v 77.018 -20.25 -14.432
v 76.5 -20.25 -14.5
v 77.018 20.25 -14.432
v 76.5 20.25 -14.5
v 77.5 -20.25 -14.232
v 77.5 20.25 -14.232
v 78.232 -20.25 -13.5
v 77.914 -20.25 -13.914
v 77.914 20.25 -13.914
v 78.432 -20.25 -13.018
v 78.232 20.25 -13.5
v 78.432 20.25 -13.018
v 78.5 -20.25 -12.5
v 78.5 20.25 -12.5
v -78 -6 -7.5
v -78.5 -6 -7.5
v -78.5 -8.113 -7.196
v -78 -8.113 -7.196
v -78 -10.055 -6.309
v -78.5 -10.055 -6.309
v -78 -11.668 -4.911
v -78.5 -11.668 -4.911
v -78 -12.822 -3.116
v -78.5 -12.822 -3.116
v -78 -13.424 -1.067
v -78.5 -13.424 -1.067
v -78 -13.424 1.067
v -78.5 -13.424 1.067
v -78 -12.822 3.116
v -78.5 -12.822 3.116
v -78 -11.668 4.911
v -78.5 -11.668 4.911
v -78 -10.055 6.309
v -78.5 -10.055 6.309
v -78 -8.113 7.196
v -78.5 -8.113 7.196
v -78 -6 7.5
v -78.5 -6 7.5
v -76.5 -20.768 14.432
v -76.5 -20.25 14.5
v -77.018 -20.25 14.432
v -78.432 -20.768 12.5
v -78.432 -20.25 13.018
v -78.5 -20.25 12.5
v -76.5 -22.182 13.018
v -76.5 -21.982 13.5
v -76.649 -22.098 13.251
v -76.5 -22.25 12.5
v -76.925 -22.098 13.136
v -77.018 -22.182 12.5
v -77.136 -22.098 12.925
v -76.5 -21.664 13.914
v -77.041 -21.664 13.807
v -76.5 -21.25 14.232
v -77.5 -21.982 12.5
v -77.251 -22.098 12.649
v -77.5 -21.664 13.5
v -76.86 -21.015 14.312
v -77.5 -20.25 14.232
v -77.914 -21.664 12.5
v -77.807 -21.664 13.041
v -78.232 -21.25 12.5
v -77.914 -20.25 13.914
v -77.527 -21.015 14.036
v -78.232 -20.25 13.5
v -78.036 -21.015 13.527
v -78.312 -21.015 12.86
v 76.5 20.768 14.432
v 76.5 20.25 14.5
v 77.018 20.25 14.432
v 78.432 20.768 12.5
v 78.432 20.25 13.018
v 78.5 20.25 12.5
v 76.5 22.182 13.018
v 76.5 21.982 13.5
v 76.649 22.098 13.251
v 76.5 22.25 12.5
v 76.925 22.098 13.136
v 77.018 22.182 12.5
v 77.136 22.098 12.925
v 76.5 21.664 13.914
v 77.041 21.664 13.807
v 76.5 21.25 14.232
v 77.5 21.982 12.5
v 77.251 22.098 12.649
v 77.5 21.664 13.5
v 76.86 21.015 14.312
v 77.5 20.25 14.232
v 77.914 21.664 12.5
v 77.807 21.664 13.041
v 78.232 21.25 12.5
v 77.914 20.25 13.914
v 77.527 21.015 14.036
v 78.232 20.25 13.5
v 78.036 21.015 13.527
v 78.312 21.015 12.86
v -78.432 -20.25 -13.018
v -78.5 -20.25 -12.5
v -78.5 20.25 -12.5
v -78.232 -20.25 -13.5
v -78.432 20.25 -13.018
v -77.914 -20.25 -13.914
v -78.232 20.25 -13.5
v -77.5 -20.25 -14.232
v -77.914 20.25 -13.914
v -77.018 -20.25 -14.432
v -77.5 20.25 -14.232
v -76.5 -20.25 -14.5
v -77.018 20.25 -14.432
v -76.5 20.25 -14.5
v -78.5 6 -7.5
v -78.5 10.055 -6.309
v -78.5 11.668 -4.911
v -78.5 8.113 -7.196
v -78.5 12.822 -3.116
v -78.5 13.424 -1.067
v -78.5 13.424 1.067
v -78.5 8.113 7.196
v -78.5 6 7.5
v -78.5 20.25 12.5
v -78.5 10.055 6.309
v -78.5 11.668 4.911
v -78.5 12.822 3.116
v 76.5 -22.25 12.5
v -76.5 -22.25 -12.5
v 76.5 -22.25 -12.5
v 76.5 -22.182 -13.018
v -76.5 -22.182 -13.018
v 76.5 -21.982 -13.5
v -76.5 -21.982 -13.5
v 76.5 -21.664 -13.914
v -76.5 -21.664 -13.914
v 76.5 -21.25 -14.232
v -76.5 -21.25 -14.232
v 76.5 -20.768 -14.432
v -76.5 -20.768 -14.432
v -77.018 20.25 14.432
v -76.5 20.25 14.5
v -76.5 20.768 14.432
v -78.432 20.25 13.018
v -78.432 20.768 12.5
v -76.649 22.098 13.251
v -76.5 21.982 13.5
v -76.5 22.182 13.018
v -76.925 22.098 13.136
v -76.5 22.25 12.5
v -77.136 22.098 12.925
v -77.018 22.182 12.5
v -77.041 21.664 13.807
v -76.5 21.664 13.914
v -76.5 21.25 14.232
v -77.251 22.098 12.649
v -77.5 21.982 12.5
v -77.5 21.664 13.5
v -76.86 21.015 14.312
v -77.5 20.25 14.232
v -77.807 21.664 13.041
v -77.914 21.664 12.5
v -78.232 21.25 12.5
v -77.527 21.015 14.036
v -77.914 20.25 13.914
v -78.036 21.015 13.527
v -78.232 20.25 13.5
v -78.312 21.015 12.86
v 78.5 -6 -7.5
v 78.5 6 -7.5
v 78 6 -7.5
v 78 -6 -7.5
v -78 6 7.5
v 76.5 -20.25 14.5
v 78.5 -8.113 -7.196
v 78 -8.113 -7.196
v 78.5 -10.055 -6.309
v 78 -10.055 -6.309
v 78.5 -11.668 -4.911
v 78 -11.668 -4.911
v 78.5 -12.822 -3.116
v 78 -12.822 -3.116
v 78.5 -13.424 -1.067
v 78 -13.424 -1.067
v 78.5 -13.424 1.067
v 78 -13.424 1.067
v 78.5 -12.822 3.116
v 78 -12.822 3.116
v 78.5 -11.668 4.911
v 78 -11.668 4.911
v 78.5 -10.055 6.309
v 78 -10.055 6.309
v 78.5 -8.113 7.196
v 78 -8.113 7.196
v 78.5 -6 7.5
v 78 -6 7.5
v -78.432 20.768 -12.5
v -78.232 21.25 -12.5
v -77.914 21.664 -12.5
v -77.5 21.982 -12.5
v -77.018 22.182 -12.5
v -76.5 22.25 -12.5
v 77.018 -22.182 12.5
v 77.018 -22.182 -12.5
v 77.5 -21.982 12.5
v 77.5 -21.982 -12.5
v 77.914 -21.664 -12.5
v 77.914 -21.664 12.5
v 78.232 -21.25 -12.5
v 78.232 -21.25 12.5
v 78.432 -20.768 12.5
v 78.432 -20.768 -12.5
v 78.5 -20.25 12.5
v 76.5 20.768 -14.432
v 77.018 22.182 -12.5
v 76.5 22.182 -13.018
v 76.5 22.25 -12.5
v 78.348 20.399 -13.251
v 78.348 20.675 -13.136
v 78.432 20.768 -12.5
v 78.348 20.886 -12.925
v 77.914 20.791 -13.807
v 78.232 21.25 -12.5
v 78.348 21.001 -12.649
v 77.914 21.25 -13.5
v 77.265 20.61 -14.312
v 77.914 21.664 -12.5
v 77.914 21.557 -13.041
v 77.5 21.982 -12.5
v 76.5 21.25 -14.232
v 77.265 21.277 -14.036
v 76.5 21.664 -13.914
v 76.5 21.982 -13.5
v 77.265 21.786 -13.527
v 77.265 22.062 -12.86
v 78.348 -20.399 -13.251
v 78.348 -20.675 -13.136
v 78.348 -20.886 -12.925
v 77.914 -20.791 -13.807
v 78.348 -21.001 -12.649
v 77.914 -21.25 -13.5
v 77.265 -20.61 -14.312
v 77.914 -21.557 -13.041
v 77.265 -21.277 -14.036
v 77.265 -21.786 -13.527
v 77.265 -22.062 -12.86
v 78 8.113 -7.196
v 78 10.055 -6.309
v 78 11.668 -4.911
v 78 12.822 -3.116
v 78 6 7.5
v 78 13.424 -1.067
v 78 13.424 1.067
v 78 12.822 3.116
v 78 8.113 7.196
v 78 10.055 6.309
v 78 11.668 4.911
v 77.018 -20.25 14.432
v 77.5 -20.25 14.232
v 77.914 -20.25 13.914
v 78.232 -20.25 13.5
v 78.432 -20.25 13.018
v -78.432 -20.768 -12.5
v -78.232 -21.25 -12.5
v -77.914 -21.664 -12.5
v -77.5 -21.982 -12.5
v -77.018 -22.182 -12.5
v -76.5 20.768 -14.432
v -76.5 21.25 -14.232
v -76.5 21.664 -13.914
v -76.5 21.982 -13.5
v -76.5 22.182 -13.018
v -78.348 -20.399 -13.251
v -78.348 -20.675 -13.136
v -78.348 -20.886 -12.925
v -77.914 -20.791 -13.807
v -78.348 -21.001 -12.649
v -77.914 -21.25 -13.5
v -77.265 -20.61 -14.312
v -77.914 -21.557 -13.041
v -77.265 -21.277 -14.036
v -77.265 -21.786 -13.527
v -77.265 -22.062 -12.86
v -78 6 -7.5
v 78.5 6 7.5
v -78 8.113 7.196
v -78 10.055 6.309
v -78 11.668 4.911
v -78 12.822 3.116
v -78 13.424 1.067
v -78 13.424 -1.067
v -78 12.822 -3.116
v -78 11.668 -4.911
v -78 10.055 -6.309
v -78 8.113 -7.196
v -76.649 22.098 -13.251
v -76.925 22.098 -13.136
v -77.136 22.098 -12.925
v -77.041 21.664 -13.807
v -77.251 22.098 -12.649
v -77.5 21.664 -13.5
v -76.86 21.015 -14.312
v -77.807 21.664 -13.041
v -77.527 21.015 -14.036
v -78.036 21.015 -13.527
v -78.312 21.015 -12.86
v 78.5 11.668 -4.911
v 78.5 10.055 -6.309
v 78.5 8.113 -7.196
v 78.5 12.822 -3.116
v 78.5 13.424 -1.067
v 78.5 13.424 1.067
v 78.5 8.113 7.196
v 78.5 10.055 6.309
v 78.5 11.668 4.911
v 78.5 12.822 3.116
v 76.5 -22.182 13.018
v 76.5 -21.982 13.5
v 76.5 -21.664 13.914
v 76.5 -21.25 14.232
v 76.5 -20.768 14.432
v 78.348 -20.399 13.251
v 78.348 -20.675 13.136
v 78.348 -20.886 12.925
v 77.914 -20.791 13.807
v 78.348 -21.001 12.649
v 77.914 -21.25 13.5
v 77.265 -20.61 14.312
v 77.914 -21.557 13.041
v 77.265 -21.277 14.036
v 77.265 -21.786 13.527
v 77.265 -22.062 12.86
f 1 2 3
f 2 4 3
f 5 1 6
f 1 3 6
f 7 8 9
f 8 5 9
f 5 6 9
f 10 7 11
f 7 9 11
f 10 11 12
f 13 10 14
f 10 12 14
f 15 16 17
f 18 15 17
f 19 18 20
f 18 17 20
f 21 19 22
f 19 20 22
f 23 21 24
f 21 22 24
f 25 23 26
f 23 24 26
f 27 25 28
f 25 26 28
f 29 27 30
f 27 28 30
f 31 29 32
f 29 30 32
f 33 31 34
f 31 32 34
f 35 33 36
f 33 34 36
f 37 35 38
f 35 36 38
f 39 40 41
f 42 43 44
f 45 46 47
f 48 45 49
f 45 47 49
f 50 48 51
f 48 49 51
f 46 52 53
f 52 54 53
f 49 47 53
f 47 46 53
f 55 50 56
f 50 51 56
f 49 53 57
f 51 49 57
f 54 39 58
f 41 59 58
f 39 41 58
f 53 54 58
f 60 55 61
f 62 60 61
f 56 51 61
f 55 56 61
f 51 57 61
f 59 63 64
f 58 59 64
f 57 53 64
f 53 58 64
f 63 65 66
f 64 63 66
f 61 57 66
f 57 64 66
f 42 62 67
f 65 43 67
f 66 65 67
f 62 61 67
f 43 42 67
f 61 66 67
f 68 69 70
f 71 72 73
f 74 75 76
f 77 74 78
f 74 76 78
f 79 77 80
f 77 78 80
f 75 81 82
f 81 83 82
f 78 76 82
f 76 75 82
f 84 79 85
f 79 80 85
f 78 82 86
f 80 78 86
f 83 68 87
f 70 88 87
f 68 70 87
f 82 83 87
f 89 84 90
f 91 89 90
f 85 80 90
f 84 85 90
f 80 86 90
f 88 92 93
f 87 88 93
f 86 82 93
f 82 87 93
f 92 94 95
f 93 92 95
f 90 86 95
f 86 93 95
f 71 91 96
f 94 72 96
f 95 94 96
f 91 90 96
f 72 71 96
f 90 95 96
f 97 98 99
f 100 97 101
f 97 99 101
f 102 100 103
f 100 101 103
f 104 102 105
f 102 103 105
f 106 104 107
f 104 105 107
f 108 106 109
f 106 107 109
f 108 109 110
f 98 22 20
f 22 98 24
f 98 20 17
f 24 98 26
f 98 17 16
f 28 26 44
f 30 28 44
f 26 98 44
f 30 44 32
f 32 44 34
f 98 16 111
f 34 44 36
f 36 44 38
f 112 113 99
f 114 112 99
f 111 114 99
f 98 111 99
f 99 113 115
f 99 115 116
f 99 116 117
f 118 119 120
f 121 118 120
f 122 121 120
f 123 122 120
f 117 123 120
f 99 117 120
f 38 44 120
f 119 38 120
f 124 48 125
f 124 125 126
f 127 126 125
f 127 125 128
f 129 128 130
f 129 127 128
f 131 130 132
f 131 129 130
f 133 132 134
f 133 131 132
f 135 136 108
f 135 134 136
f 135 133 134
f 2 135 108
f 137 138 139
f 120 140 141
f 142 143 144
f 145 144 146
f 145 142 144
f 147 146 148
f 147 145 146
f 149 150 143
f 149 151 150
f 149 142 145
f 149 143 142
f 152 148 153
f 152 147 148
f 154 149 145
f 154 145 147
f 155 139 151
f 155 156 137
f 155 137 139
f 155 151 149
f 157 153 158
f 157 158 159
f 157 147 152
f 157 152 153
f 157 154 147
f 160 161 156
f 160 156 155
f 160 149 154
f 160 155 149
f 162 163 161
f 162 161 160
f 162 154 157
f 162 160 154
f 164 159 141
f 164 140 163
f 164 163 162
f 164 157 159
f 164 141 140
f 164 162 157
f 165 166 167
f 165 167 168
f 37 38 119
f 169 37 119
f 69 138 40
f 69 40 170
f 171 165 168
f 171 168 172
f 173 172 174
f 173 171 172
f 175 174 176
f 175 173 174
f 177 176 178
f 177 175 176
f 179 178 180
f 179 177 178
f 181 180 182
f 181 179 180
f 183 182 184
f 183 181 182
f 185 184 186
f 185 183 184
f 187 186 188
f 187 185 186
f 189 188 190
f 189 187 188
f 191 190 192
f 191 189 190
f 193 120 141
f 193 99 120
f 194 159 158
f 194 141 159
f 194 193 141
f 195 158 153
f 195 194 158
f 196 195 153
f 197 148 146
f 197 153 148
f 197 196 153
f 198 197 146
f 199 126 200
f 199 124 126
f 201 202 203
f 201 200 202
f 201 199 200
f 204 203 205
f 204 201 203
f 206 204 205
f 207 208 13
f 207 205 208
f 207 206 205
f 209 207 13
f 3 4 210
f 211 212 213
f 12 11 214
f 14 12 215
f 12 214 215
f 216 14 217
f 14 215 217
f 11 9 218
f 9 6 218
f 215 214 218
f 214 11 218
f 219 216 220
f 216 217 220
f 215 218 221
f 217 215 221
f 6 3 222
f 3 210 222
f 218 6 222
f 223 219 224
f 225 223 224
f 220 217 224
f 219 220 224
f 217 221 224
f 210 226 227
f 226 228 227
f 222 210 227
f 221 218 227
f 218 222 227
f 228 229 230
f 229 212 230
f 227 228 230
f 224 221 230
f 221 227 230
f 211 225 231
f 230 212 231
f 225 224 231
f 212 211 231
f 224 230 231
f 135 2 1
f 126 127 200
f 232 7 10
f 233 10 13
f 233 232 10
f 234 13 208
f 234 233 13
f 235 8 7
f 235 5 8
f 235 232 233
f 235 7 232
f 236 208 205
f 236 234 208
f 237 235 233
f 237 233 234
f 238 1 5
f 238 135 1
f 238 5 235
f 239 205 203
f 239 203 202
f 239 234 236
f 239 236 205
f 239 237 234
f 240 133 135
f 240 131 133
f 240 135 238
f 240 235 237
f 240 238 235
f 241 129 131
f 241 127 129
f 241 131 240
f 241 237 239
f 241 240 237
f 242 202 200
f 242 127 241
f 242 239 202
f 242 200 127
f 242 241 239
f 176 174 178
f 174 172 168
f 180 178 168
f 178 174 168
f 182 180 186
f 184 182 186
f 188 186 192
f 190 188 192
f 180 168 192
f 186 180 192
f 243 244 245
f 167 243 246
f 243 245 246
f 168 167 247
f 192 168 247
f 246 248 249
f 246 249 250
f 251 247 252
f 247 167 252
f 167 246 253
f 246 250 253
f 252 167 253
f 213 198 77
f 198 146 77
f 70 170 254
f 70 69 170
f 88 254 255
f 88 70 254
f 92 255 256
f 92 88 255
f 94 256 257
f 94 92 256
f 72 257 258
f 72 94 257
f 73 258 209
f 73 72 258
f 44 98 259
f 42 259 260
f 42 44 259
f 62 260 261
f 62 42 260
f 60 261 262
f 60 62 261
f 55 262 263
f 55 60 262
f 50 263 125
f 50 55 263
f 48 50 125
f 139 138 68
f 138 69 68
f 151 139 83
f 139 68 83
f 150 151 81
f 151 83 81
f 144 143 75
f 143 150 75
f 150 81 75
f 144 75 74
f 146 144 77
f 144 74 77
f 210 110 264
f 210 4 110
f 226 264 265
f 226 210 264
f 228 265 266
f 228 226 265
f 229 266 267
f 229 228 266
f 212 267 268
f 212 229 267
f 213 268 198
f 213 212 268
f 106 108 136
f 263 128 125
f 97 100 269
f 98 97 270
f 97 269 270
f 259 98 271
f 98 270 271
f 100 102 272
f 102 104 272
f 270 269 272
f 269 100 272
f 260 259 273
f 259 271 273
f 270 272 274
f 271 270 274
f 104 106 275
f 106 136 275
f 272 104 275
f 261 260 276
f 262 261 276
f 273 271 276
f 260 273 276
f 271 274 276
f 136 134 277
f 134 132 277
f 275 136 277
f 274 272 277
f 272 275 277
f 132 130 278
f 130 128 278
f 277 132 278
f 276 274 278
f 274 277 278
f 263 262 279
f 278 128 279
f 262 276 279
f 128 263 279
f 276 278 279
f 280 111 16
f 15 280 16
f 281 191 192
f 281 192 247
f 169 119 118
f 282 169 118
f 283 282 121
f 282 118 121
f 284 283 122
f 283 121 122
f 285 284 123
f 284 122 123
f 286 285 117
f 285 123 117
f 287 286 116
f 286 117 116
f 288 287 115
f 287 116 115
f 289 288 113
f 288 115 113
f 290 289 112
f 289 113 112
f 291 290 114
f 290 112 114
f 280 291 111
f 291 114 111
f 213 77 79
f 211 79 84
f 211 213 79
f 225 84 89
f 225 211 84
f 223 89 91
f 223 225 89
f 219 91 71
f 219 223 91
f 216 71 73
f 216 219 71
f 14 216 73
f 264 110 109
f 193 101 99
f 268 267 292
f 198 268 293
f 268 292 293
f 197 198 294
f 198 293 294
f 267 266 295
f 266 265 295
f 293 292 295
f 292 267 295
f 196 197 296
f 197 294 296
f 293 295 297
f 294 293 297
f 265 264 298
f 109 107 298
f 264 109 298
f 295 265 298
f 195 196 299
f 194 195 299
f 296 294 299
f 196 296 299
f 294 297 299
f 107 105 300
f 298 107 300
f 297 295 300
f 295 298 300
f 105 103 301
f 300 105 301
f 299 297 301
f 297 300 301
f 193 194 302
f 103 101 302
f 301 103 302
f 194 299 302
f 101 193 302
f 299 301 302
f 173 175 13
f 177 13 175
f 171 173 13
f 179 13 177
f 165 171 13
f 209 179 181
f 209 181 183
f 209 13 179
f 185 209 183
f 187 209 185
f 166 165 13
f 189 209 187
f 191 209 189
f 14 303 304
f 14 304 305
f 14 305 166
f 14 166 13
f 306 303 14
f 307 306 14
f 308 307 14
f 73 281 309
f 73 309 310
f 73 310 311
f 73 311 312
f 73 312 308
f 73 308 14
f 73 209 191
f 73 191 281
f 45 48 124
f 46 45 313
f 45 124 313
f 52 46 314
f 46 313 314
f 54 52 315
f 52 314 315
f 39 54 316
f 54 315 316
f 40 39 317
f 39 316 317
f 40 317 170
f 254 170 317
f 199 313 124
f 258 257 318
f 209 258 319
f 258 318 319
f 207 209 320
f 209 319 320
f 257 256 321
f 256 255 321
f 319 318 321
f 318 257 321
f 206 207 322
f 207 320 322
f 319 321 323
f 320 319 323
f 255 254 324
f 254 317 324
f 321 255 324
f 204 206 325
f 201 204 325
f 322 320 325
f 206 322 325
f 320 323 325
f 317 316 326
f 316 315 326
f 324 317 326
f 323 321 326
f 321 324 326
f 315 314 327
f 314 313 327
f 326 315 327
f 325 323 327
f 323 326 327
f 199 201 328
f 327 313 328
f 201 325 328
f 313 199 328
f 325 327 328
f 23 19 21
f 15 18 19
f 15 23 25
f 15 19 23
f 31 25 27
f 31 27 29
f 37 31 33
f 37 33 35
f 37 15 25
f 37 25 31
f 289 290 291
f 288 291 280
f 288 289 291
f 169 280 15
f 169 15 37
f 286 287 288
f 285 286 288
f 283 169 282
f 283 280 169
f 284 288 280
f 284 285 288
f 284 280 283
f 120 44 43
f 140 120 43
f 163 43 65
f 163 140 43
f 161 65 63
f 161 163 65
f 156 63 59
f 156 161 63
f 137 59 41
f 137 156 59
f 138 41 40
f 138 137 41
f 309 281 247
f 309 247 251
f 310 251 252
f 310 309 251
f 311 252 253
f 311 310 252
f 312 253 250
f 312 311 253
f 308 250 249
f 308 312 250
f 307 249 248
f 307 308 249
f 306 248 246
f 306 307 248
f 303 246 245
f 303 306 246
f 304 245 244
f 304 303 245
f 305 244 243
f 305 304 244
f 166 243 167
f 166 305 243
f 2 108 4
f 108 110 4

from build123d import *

# Parameters (mm, degrees)
ESBO_O1_W                = 157
ESBO_O1_H                = 44.5
RESSALTO_EXTRUS_O1_DEPTH = 14.5
CORTE_EXTRUS_O1_DEPTH    = 0.5
FILETE1_R                = 2


with BuildPart() as part:
    # Esboço1 → Ressalto-extrusão1 (new body, symmetric)
    with BuildSketch(Plane.XY):
        Rectangle(ESBO_O1_W, ESBO_O1_H)
    extrude(amount=RESSALTO_EXTRUS_O1_DEPTH, both=True)

    # Esboço2 → Corte-extrusão1 (cut)
    with BuildSketch(Plane(origin=(78.5, 0, 0), x_dir=(0, 0, -1), z_dir=(1, 0, 0))):
        with BuildLine():
            Line((7.5, 6), (7.5, -6))
            ThreePointArc((7.5, -6), (0, -13.5), (-7.5, -6))
            Line((-7.5, -6), (-7.5, 6))
            ThreePointArc((-7.5, 6), (0, 13.5), (7.5, 6))
        make_face()
    corte_extrus_o1 = extrude(amount=-CORTE_EXTRUS_O1_DEPTH, mode=Mode.SUBTRACT)

    # Espelhar1: Corte-extrusão1 across plane
    add(corte_extrus_o1.mirror(Plane(origin=(0, 0, 0), x_dir=(0, 0, 1), z_dir=(1, 0, 0))), mode=Mode.SUBTRACT)

    # Filete1
    filete1_edges = [part.edges().sort_by_distance(p)[0] for p in [
        (-78.5, 0, 14.5),
        (0, -22.25, 14.5),
        (78.5, 0, 14.5),
        (0, -22.25, -14.5),
        (-78.5, 0, -14.5),
        (0, 22.25, -14.5),
        (78.5, 0, -14.5),
        (0, 22.25, 14.5),
        (78.5, -22.25, 0),
        (-78.5, -22.25, 0),
        (-78.5, 22.25, 0),
        (78.5, 22.25, 0),
    ]]
    fillet(filete1_edges, radius=FILETE1_R)


solid = part.part
